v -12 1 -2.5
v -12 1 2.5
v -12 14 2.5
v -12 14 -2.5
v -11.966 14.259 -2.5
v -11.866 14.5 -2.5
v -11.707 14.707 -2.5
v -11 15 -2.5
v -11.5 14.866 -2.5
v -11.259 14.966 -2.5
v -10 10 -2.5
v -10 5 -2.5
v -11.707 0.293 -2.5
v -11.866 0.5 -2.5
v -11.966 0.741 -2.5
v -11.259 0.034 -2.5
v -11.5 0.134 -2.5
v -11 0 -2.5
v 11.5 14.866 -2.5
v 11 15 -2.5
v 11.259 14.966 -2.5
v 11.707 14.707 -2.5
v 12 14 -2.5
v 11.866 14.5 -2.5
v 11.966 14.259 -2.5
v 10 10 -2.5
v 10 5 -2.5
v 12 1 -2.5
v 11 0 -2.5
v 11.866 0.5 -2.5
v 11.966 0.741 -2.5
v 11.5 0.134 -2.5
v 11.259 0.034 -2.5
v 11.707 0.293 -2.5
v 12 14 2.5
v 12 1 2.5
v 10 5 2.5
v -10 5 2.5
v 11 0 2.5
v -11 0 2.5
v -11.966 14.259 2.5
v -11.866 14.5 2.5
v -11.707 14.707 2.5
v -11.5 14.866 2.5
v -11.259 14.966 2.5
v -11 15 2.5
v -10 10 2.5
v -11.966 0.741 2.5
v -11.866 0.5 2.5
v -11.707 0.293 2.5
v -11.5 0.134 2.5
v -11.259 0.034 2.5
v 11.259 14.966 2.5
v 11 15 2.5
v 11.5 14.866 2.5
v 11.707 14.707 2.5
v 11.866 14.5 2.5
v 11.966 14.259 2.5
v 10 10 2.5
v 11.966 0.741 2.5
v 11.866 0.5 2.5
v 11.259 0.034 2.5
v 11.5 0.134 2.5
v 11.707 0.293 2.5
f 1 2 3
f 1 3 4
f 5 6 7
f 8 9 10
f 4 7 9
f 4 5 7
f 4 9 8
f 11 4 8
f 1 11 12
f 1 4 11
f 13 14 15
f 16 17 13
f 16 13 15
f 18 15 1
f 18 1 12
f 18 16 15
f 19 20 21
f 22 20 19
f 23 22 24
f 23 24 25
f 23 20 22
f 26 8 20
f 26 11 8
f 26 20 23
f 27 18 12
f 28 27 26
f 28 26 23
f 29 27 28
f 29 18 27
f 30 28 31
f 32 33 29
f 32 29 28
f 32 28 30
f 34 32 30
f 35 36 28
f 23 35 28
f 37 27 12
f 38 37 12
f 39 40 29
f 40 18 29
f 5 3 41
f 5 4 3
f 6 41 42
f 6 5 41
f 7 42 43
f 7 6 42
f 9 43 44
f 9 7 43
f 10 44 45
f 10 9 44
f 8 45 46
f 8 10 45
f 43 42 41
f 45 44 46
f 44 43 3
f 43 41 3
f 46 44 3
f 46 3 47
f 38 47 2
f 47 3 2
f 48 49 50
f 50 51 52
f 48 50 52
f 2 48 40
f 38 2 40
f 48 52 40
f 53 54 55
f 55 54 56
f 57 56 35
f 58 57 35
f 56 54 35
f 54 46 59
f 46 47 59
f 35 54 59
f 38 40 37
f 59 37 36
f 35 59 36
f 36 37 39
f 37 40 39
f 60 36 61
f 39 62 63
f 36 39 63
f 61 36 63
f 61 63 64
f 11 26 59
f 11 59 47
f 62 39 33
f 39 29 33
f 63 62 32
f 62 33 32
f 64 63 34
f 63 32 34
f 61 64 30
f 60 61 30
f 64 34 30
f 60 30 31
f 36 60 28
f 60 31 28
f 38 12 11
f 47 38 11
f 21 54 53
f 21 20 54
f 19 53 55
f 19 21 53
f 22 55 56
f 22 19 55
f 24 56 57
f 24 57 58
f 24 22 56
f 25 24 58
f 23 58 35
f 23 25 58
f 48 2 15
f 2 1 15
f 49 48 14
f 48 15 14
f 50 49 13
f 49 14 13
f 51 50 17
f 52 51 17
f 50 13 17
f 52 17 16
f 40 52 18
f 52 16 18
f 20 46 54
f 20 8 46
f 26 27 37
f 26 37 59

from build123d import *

# Parameters (mm, degrees)
SKETCH1_W           = 24
SKETCH1_H           = 5
BOSS_EXTRUDE1_DEPTH = 15
SKETCH2_W           = 20
SKETCH2_H           = 5
CUT_EXTRUDE1_DEPTH  = 15
FILLET2_R           = 1


with BuildPart() as part:
    # Sketch1 → Boss-Extrude1 (new body)
    with BuildSketch(Plane(origin=(0, 0, 0), x_dir=(1, 0, 0), z_dir=(0, 1, 0))):
        Rectangle(SKETCH1_W, SKETCH1_H)
    extrude(amount=BOSS_EXTRUDE1_DEPTH)

    # Sketch2 → Cut-Extrude1 (cut)
    with BuildSketch(Plane(origin=(0, 0, -2.5), x_dir=(-1, 0, 0), z_dir=(0, 0, -1))):
        with Locations((0, 7.5)):
            Rectangle(SKETCH2_W, SKETCH2_H)
    extrude(amount=-CUT_EXTRUDE1_DEPTH, mode=Mode.SUBTRACT)

    # Fillet2
    fillet2_edges = [part.edges().sort_by_distance(p)[0] for p in [
        (12, 15, 0),
        (-12, 15, 0),
        (12, 0, 0),
        (-12, 0, 0),
    ]]
    fillet(fillet2_edges, radius=FILLET2_R)


solid = part.part
